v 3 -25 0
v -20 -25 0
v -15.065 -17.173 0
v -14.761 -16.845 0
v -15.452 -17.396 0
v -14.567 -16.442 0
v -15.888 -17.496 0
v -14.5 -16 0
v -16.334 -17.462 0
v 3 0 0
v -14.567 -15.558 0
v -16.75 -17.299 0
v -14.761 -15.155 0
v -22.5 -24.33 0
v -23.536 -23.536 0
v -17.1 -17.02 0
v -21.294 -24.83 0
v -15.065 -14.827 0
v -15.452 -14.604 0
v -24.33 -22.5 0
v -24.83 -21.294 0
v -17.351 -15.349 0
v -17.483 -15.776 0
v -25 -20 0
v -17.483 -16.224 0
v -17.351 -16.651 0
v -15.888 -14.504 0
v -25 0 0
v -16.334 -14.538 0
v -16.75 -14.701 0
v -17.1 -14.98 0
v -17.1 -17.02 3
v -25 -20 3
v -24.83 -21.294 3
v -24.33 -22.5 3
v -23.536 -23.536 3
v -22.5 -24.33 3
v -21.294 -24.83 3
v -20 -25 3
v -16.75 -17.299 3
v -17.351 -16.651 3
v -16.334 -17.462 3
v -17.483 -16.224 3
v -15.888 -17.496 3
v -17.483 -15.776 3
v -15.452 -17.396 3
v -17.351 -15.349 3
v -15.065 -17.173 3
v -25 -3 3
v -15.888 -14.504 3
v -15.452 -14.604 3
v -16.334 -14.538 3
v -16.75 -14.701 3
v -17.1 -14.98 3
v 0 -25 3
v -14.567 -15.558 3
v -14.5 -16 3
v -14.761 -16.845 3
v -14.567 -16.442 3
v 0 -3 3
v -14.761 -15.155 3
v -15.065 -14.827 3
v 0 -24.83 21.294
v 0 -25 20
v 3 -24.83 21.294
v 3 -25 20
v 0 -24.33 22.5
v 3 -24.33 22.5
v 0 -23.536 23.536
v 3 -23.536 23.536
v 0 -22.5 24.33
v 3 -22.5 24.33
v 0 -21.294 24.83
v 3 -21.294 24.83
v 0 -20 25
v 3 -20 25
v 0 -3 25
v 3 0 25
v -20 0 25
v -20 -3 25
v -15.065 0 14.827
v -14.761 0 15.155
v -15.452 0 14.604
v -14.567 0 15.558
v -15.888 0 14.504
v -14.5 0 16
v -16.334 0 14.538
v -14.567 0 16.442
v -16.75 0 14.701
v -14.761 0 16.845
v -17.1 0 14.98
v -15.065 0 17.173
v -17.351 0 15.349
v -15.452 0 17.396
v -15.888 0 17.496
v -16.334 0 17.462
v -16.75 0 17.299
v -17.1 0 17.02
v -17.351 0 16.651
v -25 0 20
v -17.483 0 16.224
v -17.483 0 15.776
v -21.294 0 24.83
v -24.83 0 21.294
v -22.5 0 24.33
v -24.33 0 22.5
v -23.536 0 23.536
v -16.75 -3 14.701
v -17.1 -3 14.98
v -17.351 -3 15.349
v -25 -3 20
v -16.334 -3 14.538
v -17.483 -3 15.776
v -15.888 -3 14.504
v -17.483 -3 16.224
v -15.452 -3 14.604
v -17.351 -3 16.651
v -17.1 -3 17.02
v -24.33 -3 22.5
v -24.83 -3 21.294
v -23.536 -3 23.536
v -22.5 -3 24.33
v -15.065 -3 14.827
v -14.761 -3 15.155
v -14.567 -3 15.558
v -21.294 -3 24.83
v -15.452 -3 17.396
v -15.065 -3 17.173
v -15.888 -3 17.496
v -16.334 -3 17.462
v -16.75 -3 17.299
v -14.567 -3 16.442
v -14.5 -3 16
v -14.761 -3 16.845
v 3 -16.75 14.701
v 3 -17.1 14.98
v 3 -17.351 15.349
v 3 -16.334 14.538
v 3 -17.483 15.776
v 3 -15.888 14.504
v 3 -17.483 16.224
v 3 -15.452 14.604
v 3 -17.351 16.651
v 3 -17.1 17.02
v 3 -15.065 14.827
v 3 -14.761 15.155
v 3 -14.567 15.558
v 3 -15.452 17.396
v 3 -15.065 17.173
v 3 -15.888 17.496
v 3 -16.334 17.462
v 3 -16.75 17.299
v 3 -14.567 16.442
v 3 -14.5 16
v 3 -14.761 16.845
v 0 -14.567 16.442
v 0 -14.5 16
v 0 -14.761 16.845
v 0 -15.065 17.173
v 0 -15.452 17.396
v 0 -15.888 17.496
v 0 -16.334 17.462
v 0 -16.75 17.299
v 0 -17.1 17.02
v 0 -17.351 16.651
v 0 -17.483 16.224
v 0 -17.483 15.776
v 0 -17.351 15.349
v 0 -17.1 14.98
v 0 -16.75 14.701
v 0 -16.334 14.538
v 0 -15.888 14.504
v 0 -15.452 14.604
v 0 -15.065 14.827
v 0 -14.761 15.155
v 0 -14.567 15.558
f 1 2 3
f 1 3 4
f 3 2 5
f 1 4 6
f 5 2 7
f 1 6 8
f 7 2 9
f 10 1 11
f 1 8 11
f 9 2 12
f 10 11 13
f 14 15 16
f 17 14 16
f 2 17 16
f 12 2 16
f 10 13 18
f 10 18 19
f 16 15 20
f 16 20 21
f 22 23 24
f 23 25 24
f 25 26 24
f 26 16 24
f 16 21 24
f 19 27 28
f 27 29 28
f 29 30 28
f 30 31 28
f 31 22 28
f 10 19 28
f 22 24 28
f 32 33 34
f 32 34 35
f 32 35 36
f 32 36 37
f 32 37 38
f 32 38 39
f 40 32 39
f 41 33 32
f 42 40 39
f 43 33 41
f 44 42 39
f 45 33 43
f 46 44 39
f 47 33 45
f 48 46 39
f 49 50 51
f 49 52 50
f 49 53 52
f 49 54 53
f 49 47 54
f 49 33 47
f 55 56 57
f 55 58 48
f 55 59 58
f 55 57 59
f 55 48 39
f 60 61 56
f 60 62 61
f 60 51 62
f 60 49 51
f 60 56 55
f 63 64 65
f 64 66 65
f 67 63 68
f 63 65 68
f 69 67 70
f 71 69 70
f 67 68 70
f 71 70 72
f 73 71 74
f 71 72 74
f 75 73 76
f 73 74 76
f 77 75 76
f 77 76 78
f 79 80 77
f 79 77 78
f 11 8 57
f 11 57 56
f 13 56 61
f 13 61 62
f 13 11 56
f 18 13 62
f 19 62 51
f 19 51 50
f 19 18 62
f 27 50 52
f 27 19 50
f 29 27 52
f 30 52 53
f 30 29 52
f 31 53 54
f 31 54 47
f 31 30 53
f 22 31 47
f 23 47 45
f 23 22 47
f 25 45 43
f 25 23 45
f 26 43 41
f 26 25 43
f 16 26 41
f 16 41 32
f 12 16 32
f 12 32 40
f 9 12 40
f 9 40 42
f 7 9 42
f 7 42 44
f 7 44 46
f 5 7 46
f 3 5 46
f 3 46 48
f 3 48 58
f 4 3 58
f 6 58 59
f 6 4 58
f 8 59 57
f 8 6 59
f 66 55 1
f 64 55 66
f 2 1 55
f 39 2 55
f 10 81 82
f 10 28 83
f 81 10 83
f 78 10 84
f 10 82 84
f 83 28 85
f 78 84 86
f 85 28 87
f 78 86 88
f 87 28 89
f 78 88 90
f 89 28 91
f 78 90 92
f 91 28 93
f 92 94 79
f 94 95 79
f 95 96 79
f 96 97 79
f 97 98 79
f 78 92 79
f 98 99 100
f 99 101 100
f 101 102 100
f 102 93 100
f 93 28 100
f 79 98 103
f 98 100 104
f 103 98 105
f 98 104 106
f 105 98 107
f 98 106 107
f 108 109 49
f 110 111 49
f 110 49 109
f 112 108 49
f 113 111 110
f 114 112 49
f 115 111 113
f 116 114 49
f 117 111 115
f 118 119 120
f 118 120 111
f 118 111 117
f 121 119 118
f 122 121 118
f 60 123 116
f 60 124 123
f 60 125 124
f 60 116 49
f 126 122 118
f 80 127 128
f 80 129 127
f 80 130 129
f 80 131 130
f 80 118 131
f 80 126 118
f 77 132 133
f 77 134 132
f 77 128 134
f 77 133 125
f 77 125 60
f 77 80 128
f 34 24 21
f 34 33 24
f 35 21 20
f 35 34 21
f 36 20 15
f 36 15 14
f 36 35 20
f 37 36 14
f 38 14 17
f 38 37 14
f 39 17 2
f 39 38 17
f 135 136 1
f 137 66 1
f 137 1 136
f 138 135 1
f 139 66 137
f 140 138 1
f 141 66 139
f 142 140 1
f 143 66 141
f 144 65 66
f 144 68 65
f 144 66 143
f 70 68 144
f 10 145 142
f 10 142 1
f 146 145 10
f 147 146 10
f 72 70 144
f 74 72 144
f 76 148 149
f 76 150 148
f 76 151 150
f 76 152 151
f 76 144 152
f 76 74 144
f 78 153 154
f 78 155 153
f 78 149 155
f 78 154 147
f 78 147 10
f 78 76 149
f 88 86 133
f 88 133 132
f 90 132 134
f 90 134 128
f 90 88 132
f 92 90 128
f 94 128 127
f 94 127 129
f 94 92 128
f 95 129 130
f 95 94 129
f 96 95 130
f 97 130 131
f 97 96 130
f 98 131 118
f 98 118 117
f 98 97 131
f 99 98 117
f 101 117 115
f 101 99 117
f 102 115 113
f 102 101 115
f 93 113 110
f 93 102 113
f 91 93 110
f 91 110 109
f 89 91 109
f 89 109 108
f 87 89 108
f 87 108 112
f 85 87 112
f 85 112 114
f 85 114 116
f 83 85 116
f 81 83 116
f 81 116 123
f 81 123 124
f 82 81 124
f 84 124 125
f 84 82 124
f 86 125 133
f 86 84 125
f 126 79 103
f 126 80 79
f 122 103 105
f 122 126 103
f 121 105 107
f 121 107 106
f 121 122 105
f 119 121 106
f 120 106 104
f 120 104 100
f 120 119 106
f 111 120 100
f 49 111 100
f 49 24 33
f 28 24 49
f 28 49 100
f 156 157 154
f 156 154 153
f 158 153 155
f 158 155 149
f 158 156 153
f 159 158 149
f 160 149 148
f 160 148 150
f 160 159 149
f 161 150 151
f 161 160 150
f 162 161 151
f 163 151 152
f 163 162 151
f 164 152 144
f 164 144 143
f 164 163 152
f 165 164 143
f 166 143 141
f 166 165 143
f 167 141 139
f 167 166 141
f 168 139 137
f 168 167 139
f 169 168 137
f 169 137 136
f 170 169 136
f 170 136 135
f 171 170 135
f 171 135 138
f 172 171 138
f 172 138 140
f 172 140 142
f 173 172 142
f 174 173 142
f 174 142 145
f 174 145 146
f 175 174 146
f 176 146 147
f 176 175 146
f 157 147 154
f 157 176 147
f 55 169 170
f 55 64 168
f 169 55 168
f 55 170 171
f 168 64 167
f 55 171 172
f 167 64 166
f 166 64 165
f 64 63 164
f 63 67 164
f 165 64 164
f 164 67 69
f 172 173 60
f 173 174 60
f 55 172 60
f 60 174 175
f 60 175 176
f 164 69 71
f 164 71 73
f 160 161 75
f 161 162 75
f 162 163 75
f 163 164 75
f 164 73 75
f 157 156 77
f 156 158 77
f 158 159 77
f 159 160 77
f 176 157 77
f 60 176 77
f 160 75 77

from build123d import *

# Parameters (mm, degrees)
F0_W     = 25
F0_H     = 25
F0_R     = 1.5
F3_DEPTH = 3
F4_R     = 5
F1_W     = 25
F1_H     = 25
F1_R     = 1.5
F5_DEPTH = 3
F6_R     = 5
F2_W     = 25
F2_H     = 25
F2_R     = 1.5
F7_DEPTH = 3
F8_R     = 5


with BuildPart() as f3:
    # F0 (on Top) → F3 (new body)
    with BuildSketch(Plane.XY):
        with Locations((-12.5, -12.5)):
            Rectangle(F0_W, F0_H)
        with Locations((-16, -16)):
            Circle(F0_R, mode=Mode.SUBTRACT)
    extrude(amount=F3_DEPTH)

    # F4
    f4_edges = [f3.edges().sort_by_distance(p)[0] for p in [
        (-25, -25, 1.5),
    ]]
    fillet(f4_edges, radius=F4_R)

    # F1 (on Right) → F5 (join)
    with BuildSketch(Plane.YZ):
        with Locations((-12.5, 12.5)):
            Rectangle(F1_W, F1_H)
        with Locations((-16, 16)):
            Circle(F1_R, mode=Mode.SUBTRACT)
    extrude(amount=F5_DEPTH)

    # F6
    f6_edges = [f3.edges().sort_by_distance(p)[0] for p in [
        (1.5, -25, 25),
    ]]
    fillet(f6_edges, radius=F6_R)

    # F2 (on Front) → F7 (join)
    with BuildSketch(Plane.XZ):
        with Locations((-12.5, 12.5)):
            Rectangle(F2_W, F2_H)
        with Locations((-16, 16)):
            Circle(F2_R, mode=Mode.SUBTRACT)
    extrude(amount=F7_DEPTH)

    # F8
    f8_edges = [f3.edges().sort_by_distance(p)[0] for p in [
        (-25, -1.5, 25),
    ]]
    fillet(f8_edges, radius=F8_R)


solid = f3.part
